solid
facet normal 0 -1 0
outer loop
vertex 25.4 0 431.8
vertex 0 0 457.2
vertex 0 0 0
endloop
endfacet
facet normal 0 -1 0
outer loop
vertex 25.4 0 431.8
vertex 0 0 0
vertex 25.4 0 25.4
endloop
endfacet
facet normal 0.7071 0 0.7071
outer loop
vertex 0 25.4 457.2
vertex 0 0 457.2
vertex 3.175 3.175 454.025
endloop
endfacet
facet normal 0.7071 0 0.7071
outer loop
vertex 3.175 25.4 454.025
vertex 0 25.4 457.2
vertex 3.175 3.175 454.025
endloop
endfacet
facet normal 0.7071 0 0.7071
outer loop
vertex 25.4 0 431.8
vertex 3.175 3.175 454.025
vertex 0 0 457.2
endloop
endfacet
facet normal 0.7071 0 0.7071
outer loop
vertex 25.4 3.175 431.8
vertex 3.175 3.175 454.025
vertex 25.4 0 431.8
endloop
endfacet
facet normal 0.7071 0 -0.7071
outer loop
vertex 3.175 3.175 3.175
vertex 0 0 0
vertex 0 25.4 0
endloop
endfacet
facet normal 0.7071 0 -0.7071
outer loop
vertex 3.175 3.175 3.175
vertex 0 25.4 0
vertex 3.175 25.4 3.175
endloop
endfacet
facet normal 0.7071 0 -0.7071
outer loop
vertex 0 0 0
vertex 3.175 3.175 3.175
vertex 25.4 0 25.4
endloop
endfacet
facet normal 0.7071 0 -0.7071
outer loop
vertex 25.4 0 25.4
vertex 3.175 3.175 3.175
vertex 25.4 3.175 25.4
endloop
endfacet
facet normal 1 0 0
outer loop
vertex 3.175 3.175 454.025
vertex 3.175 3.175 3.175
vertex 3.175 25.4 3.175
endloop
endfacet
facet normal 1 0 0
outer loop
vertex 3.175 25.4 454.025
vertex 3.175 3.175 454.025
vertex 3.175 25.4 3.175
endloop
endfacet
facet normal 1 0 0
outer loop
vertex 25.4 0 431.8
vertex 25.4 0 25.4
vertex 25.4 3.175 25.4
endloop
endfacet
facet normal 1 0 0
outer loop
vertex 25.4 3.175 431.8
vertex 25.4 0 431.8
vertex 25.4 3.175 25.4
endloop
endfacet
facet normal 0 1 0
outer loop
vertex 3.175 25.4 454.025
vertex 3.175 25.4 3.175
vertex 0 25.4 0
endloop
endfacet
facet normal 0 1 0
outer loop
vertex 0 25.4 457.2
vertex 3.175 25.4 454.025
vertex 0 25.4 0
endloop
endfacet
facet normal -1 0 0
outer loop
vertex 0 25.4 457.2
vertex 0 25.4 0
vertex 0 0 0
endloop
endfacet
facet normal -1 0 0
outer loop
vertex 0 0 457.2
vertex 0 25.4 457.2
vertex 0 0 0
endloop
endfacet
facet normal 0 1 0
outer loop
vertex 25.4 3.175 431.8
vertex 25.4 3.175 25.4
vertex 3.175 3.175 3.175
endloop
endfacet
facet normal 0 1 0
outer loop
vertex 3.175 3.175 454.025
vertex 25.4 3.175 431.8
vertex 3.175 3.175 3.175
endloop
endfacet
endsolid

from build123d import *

# Parameters (mm, degrees)
BOSS_EXTRUDE1_DEPTH     = 457.2
CUT_EXTRUDE1_DEPTH      = 23.225
CUT_EXTRUDE1_DEPTH_BACK = 4.175


with BuildPart() as part:
    # Sketch1 → Boss-Extrude1 (new body)
    with BuildSketch(Plane.XY):
        Polygon((0, 0), (25.4, 0), (25.4, 3.175), (3.175, 3.175), (3.175, 25.4), (0, 25.4), align=None)
    extrude(amount=BOSS_EXTRUDE1_DEPTH)

    # Sketch2 → Cut-Extrude1 (cut, two sides)
    with BuildSketch(Plane(origin=(0, 3.175, 0), x_dir=(1, 0, 0), z_dir=(0, 1, 0))) as cut_extrude1_sk:
        Polygon((0, 0), (25.4, -25.4), (25.4, 0), align=None)
        Polygon((0, -457.2), (25.4, -431.8), (25.4, -457.2), align=None)
    extrude(amount=CUT_EXTRUDE1_DEPTH, mode=Mode.SUBTRACT)
    extrude(cut_extrude1_sk.sketch, amount=-CUT_EXTRUDE1_DEPTH_BACK, mode=Mode.SUBTRACT)


solid = part.part
